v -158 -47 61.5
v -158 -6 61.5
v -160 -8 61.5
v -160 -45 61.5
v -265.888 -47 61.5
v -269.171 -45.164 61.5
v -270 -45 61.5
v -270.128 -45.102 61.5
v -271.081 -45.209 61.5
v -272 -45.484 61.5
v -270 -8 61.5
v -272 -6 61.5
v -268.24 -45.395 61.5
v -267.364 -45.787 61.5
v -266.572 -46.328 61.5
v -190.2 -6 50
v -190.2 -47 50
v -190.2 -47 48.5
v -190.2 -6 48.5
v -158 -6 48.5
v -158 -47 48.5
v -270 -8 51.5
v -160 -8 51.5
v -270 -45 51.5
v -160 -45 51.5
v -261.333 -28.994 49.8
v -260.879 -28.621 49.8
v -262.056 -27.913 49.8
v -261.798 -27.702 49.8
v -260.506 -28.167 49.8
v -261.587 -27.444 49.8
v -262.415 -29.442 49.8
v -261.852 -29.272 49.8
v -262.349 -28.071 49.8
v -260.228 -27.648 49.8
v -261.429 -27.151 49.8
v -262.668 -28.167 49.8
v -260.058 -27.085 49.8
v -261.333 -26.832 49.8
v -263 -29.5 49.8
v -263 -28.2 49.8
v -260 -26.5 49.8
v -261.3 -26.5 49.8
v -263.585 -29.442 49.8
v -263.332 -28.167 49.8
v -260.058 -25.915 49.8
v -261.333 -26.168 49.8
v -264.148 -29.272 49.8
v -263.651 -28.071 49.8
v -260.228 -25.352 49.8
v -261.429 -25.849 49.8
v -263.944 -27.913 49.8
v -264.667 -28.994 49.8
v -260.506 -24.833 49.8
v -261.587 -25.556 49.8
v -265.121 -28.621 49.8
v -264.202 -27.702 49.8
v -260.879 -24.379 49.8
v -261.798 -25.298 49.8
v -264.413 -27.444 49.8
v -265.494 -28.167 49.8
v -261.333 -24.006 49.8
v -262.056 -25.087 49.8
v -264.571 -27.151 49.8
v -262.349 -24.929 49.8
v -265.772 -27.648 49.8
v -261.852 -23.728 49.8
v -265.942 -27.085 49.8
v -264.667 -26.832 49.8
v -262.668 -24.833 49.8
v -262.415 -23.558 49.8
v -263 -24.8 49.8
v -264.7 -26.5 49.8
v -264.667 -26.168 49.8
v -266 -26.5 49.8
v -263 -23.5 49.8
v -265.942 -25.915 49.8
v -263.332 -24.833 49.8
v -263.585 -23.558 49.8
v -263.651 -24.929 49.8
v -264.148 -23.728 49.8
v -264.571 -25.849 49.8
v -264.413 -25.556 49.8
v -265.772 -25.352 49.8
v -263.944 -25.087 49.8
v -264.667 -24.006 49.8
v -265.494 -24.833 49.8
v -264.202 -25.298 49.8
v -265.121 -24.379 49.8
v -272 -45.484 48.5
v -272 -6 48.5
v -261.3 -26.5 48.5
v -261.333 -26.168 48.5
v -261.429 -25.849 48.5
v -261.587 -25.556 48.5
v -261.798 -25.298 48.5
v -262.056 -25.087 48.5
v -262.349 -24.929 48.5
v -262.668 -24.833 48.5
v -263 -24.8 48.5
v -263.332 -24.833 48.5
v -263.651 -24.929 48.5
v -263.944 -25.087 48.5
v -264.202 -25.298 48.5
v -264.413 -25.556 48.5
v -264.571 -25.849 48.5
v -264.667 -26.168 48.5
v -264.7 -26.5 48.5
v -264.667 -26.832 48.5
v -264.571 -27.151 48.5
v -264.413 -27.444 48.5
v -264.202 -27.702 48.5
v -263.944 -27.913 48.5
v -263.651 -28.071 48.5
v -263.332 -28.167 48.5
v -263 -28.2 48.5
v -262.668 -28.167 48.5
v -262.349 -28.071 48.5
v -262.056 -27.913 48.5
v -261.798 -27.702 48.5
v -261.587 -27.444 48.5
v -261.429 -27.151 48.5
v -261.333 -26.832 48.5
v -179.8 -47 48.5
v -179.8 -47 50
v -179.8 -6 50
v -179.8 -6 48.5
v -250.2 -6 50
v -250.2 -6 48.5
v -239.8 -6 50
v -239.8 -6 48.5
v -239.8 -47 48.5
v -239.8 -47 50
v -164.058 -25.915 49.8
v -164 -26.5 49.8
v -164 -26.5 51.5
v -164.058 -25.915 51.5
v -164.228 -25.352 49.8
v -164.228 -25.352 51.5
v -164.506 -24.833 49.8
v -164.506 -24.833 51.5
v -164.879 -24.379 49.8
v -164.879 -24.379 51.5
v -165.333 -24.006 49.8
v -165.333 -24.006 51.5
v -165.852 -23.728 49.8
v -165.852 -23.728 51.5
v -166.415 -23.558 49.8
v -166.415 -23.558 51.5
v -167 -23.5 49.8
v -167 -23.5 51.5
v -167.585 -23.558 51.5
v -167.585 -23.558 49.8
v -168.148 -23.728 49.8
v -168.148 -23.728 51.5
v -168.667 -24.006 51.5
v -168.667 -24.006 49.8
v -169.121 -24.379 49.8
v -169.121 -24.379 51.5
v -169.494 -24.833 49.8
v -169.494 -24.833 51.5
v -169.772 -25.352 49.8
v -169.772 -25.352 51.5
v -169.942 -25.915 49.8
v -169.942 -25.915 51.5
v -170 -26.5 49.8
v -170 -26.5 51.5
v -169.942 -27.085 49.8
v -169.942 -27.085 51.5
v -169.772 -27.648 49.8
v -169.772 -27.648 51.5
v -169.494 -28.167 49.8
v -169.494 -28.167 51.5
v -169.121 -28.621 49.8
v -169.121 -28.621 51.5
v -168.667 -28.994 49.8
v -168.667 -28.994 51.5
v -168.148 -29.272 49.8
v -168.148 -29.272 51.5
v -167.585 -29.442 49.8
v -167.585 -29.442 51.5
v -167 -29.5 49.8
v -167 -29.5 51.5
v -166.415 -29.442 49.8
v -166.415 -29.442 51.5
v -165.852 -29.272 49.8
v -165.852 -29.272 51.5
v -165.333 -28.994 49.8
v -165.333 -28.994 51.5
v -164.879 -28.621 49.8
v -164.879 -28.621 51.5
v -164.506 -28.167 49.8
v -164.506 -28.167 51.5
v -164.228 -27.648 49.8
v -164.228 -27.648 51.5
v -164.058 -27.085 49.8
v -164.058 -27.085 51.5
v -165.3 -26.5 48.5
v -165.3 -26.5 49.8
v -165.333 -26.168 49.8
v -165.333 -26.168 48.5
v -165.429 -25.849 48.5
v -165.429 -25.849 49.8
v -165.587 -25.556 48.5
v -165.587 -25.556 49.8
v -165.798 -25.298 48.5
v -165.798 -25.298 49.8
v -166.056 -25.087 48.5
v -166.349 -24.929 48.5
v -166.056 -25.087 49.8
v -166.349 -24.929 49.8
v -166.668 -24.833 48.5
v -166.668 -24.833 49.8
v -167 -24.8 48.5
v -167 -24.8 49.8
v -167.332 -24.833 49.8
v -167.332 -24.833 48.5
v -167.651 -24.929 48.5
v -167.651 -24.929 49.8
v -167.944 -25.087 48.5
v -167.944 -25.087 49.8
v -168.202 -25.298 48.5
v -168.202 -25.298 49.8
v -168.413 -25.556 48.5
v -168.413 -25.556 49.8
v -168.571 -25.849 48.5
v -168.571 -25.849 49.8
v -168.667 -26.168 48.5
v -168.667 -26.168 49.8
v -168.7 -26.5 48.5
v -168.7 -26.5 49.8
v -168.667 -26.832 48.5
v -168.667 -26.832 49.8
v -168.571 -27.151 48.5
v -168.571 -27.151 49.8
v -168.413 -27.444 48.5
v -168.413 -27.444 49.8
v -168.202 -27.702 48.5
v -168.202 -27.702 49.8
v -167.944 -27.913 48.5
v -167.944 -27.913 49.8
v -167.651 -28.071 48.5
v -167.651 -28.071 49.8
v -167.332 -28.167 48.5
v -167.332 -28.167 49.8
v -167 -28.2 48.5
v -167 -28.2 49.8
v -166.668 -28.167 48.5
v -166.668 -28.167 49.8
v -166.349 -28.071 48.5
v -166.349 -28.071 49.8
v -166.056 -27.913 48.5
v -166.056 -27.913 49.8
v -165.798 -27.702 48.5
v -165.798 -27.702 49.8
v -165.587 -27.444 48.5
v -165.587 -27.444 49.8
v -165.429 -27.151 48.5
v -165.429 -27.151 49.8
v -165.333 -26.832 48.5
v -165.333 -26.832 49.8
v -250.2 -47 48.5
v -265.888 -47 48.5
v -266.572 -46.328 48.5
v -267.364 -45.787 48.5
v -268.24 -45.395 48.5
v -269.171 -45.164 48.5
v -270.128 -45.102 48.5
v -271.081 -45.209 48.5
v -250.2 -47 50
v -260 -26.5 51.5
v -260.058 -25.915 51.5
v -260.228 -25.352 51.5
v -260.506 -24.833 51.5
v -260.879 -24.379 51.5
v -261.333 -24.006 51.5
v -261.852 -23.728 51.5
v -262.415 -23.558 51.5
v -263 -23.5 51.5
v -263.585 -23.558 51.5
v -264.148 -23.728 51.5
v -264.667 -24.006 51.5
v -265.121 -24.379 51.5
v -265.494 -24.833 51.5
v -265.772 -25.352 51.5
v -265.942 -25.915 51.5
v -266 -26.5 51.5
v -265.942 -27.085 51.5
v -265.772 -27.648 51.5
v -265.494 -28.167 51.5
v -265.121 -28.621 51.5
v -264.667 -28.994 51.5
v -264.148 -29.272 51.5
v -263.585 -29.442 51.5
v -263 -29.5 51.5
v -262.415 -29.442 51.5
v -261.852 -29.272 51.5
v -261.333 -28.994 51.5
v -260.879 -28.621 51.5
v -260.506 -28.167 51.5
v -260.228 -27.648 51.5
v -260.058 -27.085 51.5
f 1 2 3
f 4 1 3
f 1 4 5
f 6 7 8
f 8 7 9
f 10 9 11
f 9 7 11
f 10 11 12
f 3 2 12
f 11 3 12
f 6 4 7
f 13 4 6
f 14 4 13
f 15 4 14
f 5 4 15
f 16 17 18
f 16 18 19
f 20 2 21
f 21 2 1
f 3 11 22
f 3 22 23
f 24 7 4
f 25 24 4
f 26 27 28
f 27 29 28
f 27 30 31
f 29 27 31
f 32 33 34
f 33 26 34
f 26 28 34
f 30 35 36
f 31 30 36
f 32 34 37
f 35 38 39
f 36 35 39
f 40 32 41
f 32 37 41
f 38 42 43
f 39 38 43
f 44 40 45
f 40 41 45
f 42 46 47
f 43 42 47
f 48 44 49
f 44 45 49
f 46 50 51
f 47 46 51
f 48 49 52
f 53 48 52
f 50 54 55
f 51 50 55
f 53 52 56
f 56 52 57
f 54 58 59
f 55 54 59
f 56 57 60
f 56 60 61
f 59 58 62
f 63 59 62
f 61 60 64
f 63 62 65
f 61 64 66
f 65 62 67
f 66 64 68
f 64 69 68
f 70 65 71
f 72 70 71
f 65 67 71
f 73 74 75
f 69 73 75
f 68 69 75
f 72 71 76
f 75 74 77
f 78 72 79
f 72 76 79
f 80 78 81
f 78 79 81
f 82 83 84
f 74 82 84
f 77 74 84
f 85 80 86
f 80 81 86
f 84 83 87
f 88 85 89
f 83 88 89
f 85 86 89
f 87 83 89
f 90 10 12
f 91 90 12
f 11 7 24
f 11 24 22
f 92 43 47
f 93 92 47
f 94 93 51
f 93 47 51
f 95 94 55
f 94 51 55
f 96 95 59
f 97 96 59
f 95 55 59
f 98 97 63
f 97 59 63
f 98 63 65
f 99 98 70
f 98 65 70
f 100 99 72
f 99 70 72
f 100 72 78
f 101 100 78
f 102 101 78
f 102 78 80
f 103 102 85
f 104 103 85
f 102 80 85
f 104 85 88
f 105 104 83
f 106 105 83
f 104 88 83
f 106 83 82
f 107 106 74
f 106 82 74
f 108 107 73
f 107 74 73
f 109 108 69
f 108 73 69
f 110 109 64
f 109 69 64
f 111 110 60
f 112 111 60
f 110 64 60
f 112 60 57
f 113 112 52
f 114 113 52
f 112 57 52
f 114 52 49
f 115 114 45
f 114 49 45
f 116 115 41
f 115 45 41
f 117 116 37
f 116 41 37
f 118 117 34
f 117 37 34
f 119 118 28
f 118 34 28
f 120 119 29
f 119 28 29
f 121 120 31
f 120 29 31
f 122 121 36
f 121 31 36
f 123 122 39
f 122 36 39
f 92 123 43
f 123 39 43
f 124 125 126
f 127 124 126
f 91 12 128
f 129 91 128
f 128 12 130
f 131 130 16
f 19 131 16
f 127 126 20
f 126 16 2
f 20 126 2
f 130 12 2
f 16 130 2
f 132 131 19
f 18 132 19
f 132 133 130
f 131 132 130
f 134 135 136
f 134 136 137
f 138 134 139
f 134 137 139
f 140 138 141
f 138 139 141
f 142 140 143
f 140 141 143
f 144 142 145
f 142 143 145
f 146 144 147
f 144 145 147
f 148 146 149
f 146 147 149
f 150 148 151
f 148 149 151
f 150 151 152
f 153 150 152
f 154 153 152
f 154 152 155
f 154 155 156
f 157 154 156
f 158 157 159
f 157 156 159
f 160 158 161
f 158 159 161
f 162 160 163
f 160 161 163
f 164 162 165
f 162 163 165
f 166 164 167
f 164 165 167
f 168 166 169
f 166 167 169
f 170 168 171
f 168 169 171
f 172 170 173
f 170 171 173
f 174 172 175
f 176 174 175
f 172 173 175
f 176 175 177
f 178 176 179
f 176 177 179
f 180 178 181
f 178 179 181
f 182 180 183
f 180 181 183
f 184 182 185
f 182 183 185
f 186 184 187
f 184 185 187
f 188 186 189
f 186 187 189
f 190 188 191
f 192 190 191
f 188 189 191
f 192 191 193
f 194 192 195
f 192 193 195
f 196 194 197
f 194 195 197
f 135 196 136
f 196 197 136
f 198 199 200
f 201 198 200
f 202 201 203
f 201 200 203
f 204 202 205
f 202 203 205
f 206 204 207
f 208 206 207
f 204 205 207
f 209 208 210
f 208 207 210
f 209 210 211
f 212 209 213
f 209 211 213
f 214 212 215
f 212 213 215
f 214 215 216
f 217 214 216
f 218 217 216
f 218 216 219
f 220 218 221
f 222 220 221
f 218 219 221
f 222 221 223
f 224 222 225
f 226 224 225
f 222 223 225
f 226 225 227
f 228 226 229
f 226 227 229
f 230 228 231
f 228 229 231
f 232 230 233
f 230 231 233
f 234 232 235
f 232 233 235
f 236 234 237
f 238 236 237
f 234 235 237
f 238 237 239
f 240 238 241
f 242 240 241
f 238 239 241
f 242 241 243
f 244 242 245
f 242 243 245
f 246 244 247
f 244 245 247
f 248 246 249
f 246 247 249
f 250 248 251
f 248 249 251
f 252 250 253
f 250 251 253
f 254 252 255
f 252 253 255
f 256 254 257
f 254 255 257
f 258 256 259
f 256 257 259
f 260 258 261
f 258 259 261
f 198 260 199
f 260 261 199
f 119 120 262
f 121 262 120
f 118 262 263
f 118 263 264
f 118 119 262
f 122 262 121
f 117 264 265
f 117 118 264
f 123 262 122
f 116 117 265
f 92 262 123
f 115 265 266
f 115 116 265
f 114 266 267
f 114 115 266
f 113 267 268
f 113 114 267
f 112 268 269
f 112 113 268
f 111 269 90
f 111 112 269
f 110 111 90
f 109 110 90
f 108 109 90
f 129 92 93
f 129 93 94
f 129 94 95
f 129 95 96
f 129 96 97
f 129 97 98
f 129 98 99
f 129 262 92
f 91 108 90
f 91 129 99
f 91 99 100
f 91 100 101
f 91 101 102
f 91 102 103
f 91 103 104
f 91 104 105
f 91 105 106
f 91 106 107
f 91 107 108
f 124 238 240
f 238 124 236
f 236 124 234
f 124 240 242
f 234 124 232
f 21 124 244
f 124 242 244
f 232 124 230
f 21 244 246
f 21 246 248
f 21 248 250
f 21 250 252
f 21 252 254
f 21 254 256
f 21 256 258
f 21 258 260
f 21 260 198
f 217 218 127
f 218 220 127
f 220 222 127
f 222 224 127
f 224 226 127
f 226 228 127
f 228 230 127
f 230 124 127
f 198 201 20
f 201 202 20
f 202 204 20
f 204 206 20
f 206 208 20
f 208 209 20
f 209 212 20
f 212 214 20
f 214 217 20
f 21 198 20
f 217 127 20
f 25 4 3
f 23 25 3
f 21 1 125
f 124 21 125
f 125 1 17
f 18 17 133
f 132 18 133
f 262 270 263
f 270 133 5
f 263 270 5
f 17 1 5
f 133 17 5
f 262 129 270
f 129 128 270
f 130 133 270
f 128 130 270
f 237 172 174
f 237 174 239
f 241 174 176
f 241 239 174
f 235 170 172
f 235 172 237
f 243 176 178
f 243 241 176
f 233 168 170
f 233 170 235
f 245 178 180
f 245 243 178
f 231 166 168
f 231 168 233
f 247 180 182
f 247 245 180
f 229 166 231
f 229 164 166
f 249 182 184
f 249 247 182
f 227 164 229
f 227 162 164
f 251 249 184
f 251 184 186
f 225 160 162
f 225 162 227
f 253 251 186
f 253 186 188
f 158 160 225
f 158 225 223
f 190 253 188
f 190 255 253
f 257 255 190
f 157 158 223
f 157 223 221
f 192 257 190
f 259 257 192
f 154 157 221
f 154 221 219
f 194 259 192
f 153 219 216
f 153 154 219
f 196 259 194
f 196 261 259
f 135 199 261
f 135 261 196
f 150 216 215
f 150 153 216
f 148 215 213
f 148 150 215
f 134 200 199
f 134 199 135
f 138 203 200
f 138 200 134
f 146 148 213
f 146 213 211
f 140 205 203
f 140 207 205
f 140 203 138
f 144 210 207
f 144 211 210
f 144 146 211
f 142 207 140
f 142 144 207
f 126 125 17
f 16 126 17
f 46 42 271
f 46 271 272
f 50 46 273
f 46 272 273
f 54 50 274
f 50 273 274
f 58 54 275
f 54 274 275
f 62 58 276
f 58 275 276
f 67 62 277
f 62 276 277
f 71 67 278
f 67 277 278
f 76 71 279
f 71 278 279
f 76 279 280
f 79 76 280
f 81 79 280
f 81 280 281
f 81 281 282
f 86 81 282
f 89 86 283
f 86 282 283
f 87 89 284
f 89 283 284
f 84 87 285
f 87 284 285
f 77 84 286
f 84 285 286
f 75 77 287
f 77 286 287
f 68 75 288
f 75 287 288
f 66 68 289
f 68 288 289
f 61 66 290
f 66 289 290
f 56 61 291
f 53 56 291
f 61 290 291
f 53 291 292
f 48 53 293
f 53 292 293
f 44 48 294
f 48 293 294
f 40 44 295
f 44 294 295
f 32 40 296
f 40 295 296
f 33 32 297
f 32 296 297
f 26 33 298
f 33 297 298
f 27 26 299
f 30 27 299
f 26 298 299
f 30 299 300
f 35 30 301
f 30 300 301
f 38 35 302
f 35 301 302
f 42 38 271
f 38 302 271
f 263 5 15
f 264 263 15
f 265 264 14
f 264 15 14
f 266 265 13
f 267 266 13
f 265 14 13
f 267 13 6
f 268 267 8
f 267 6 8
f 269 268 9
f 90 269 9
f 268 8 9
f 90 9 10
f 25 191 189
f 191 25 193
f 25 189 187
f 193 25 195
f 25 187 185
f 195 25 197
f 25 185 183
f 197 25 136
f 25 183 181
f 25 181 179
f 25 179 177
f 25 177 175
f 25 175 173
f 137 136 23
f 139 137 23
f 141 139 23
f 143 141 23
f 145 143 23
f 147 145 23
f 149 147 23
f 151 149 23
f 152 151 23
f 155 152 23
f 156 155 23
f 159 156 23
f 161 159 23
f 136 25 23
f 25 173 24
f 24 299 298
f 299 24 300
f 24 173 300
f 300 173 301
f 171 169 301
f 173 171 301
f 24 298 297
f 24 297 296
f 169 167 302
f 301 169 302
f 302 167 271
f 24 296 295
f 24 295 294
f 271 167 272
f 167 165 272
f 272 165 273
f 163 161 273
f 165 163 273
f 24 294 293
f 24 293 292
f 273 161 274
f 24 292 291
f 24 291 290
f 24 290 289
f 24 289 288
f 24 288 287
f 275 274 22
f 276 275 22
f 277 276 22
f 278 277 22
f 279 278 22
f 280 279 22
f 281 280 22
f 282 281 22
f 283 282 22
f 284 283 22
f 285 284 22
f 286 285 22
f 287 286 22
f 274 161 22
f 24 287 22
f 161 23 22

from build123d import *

# Parameters (mm, degrees)
MAIN_PROFILE_SKETCH_W       = 110
MAIN_PROFILE_SKETCH_H       = 37
MAIN_EXTRUSION_DEPTH        = 10
DETAIL_PROFILE_2_SKETCH_R   = 3
DETAIL_EXTRUSION_2_DEPTH    = 1.5
DETAIL_PROFILE_3_SKETCH_R   = 3
DETAIL_PROFILE_3_SKETCH_W   = 21.8
DETAIL_PROFILE_3_SKETCH_H   = 41
DETAIL_PROFILE_3_SKETCH_W_2 = 49.6
DETAIL_EXTRUSION_3_DEPTH    = 0.2
DETAIL_PROFILE_4_SKETCH_R   = 1.7
DETAIL_PROFILE_4_SKETCH_W   = 49.6
DETAIL_PROFILE_4_SKETCH_H   = 41
DETAIL_PROFILE_4_SKETCH_W_2 = 21.8
DETAIL_EXTRUSION_4_DEPTH    = 1.3


with BuildPart() as part:
    # Main Profile Sketch → Main Extrusion (new body)
    with BuildSketch(Plane.XY.offset(61.5)):
        with BuildLine():
            Line((-272, -6), (-158, -6))
            Line((-158, -6), (-158, -47))
            Line((-158, -47), (-265.887822961, -47))
            ThreePointArc((-265.887822961, -47), (-268.700050917, -45.258804298), (-272, -45.484025518))
            Line((-272, -45.484025518), (-272, -6))
        make_face()
        with Locations((-215, -26.5)):
            Rectangle(MAIN_PROFILE_SKETCH_W, MAIN_PROFILE_SKETCH_H, mode=Mode.SUBTRACT)
    extrude(amount=-MAIN_EXTRUSION_DEPTH)

    # Detail Profile 2 Sketch → Detail Extrusion 2 (add)
    with BuildSketch(Plane.XY.offset(51.5)):
        with BuildLine():
            Line((-272, -6), (-158, -6))
            Line((-158, -6), (-158, -47))
            Line((-158, -47), (-265.887822961, -47))
            ThreePointArc((-265.887822961, -47), (-268.700050917, -45.258804298), (-272, -45.484025518))
            Line((-272, -45.484025518), (-272, -6))
        make_face()
        with Locations((-263, -26.5)):
            Circle(DETAIL_PROFILE_2_SKETCH_R, mode=Mode.SUBTRACT)
        with Locations((-167, -26.5)):
            Circle(DETAIL_PROFILE_2_SKETCH_R, mode=Mode.SUBTRACT)
    extrude(amount=-DETAIL_EXTRUSION_2_DEPTH)

    # Detail Profile 3 Sketch → Detail Extrusion 3 (add)
    # profile 1 of 3: a face of its own
    with BuildSketch(Plane.XY.offset(50)):
        with BuildLine():
            Line((-272, -6), (-250.2, -6))
            Line((-250.2, -6), (-250.2, -47))
            Line((-250.2, -47), (-265.887822961, -47))
            ThreePointArc((-265.887822961, -47), (-268.700050917, -45.258804298), (-272, -45.484025518))
            Line((-272, -45.484025518), (-272, -6))
        make_face()
        with Locations((-263, -26.5)):
            Circle(DETAIL_PROFILE_3_SKETCH_R, mode=Mode.SUBTRACT)
    # profile 2 of 3: a face of its own
    with BuildSketch(Plane.XY.offset(50)):
        with Locations((-168.9, -26.5)):
            Rectangle(DETAIL_PROFILE_3_SKETCH_W, DETAIL_PROFILE_3_SKETCH_H)
        with Locations((-167, -26.5)):
            Circle(DETAIL_PROFILE_3_SKETCH_R, mode=Mode.SUBTRACT)
    # profile 3 of 3: a face of its own
    with BuildSketch(Plane.XY.offset(50)):
        with Locations((-215, -26.5)):
            Rectangle(DETAIL_PROFILE_3_SKETCH_W_2, DETAIL_PROFILE_3_SKETCH_H)
    extrude(amount=-DETAIL_EXTRUSION_3_DEPTH)

    # Detail Profile 4 Sketch → Detail Extrusion 4 (add)
    # profile 1 of 3: a face of its own
    with BuildSketch(Plane.XY.offset(49.8)):
        with BuildLine():
            Line((-272, -6), (-250.2, -6))
            Line((-250.2, -6), (-250.2, -47))
            Line((-250.2, -47), (-265.887822961, -47))
            ThreePointArc((-265.887822961, -47), (-268.700050917, -45.258804298), (-272, -45.484025518))
            Line((-272, -45.484025518), (-272, -6))
        make_face()
        with Locations((-263, -26.5)):
            Circle(DETAIL_PROFILE_4_SKETCH_R, mode=Mode.SUBTRACT)
    # profile 2 of 3: a face of its own
    with BuildSketch(Plane.XY.offset(49.8)):
        with Locations((-215, -26.5)):
            Rectangle(DETAIL_PROFILE_4_SKETCH_W, DETAIL_PROFILE_4_SKETCH_H)
    # profile 3 of 3: a face of its own
    with BuildSketch(Plane.XY.offset(49.8)):
        with Locations((-168.9, -26.5)):
            Rectangle(DETAIL_PROFILE_4_SKETCH_W_2, DETAIL_PROFILE_4_SKETCH_H)
        with Locations((-167, -26.5)):
            Circle(DETAIL_PROFILE_4_SKETCH_R, mode=Mode.SUBTRACT)
    extrude(amount=-DETAIL_EXTRUSION_4_DEPTH)


solid = part.part
